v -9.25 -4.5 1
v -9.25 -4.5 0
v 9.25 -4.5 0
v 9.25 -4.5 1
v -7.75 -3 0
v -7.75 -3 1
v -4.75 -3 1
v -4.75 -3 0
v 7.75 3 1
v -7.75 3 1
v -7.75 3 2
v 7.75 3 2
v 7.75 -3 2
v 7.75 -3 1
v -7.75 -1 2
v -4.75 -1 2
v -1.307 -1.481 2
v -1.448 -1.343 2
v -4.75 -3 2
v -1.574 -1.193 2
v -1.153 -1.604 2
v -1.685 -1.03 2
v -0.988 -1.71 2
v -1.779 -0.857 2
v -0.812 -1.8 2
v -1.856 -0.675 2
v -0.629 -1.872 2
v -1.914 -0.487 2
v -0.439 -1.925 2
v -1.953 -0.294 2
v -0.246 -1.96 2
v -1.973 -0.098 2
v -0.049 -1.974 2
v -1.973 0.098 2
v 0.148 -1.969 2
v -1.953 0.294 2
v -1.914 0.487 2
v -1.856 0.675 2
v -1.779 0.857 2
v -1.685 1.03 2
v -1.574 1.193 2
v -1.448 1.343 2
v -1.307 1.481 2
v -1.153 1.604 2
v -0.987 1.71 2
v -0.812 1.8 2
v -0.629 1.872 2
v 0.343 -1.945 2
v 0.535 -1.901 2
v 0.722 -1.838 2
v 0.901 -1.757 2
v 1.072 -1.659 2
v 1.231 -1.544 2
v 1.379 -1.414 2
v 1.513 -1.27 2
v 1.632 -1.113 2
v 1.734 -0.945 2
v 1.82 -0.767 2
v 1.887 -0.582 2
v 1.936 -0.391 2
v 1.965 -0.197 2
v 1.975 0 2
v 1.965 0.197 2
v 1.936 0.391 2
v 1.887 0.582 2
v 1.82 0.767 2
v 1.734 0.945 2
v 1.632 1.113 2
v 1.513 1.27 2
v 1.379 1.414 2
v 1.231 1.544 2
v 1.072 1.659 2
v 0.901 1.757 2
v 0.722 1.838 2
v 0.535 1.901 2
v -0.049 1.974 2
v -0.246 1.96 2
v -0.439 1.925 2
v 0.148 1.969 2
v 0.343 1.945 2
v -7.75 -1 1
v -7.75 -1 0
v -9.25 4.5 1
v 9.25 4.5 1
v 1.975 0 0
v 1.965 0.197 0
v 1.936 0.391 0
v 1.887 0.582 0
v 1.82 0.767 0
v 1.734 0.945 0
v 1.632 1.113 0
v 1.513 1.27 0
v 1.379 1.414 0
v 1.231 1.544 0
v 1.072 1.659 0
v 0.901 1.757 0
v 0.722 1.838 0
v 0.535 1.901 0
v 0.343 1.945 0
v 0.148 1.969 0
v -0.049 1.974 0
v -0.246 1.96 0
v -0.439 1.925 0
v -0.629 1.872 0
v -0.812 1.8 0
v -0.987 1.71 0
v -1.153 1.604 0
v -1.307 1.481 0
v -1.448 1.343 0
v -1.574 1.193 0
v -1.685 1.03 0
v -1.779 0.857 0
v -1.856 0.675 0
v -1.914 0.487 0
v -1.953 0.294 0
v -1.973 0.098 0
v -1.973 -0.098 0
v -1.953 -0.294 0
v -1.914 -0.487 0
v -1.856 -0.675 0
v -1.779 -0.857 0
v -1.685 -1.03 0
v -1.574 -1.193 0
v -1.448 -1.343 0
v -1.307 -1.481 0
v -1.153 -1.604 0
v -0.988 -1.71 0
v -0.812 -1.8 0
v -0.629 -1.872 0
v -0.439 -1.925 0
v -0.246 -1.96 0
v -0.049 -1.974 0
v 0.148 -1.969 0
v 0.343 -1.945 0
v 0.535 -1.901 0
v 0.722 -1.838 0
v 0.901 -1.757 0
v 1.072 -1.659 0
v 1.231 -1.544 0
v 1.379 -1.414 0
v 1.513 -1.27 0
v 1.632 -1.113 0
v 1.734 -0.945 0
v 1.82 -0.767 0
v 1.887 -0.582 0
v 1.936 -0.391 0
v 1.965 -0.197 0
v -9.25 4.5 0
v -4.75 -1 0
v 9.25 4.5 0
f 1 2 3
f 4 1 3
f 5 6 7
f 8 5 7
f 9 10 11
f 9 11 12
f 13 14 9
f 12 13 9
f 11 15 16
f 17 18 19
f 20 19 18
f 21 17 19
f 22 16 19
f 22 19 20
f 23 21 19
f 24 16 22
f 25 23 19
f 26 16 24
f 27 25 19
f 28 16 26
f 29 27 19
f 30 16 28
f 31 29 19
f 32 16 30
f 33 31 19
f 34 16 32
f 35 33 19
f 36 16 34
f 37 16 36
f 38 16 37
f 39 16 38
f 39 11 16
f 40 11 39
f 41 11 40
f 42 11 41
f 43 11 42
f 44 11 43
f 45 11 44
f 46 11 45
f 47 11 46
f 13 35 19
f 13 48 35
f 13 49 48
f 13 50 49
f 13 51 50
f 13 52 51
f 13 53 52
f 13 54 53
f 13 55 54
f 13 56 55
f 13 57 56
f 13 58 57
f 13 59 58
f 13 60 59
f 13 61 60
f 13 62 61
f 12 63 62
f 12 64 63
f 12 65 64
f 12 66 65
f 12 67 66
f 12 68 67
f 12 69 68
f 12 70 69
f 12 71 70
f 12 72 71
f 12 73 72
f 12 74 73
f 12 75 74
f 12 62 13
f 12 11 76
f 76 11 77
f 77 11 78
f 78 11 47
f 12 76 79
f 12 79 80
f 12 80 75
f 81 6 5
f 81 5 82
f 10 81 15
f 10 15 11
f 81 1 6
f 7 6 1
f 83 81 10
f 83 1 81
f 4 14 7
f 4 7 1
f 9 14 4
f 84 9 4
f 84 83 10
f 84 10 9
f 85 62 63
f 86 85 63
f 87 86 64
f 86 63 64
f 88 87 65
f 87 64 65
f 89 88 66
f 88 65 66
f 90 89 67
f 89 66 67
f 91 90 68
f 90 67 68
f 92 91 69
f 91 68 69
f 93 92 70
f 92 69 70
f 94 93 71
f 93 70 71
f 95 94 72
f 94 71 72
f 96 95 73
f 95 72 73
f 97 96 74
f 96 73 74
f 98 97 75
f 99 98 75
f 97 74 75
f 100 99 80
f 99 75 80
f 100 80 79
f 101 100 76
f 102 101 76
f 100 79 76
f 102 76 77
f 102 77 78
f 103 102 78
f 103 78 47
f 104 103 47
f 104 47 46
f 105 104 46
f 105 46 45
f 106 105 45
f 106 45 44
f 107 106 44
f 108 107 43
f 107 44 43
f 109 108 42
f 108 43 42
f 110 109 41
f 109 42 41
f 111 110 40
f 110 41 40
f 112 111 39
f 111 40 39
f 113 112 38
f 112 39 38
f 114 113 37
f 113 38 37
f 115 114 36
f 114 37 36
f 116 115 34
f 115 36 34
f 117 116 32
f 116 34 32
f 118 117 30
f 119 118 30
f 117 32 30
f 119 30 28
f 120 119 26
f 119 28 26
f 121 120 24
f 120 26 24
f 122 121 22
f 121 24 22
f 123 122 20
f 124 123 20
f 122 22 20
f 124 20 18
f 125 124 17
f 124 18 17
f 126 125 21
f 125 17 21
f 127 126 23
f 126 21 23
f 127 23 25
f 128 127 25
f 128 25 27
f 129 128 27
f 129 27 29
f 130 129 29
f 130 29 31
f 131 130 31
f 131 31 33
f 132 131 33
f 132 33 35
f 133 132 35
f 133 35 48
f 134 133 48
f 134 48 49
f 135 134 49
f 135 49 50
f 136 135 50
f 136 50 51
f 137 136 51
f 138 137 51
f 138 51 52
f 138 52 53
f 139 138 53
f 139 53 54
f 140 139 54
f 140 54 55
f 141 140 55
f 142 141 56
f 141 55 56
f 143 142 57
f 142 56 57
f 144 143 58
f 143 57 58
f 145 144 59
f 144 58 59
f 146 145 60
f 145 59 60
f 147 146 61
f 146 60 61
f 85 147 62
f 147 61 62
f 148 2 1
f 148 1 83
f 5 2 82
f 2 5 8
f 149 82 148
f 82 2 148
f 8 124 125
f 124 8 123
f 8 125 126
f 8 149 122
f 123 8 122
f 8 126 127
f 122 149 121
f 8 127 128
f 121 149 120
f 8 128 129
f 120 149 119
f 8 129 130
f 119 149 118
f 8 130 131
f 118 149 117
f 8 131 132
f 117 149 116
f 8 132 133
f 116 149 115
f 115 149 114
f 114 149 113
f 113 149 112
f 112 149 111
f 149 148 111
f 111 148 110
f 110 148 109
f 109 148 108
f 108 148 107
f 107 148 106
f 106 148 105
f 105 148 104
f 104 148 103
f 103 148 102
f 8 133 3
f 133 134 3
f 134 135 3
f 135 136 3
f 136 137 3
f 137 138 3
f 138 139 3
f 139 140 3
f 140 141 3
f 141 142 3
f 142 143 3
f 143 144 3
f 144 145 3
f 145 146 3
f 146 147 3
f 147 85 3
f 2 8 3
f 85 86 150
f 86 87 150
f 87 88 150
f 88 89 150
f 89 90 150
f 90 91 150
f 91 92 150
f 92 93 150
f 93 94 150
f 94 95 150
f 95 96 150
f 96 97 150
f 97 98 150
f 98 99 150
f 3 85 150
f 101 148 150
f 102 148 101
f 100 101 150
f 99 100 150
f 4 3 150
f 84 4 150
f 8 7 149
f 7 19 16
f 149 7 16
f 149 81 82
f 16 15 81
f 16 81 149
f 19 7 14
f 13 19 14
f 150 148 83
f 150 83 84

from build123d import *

# Parameters (mm, degrees)
F0_W     = 18.5
F0_H     = 9
F1_DEPTH = 1
F2_W     = 15.5
F2_H     = 6
F3_DEPTH = 1
F4_R     = 1.975
F4_W     = 3
F4_H     = 2
F5_DEPTH = 2


with BuildPart() as f1:
    # F0 (on Top) → F1 (new body)
    with BuildSketch(Plane.XY):
        Rectangle(F0_W, F0_H)
    extrude(amount=F1_DEPTH)

    # F2 (on face) → F3 (join)
    with BuildSketch(Plane.XY.offset(1)):
        Rectangle(F2_W, F2_H)
    extrude(amount=F3_DEPTH)

    # F4 (on face) → F5 (cut)
    with BuildSketch(Plane.XY.offset(2)):
        Circle(F4_R)
        with Locations((-6.25, -2)):
            Rectangle(F4_W, F4_H)
    extrude(amount=-F5_DEPTH, mode=Mode.SUBTRACT)


solid = f1.part
